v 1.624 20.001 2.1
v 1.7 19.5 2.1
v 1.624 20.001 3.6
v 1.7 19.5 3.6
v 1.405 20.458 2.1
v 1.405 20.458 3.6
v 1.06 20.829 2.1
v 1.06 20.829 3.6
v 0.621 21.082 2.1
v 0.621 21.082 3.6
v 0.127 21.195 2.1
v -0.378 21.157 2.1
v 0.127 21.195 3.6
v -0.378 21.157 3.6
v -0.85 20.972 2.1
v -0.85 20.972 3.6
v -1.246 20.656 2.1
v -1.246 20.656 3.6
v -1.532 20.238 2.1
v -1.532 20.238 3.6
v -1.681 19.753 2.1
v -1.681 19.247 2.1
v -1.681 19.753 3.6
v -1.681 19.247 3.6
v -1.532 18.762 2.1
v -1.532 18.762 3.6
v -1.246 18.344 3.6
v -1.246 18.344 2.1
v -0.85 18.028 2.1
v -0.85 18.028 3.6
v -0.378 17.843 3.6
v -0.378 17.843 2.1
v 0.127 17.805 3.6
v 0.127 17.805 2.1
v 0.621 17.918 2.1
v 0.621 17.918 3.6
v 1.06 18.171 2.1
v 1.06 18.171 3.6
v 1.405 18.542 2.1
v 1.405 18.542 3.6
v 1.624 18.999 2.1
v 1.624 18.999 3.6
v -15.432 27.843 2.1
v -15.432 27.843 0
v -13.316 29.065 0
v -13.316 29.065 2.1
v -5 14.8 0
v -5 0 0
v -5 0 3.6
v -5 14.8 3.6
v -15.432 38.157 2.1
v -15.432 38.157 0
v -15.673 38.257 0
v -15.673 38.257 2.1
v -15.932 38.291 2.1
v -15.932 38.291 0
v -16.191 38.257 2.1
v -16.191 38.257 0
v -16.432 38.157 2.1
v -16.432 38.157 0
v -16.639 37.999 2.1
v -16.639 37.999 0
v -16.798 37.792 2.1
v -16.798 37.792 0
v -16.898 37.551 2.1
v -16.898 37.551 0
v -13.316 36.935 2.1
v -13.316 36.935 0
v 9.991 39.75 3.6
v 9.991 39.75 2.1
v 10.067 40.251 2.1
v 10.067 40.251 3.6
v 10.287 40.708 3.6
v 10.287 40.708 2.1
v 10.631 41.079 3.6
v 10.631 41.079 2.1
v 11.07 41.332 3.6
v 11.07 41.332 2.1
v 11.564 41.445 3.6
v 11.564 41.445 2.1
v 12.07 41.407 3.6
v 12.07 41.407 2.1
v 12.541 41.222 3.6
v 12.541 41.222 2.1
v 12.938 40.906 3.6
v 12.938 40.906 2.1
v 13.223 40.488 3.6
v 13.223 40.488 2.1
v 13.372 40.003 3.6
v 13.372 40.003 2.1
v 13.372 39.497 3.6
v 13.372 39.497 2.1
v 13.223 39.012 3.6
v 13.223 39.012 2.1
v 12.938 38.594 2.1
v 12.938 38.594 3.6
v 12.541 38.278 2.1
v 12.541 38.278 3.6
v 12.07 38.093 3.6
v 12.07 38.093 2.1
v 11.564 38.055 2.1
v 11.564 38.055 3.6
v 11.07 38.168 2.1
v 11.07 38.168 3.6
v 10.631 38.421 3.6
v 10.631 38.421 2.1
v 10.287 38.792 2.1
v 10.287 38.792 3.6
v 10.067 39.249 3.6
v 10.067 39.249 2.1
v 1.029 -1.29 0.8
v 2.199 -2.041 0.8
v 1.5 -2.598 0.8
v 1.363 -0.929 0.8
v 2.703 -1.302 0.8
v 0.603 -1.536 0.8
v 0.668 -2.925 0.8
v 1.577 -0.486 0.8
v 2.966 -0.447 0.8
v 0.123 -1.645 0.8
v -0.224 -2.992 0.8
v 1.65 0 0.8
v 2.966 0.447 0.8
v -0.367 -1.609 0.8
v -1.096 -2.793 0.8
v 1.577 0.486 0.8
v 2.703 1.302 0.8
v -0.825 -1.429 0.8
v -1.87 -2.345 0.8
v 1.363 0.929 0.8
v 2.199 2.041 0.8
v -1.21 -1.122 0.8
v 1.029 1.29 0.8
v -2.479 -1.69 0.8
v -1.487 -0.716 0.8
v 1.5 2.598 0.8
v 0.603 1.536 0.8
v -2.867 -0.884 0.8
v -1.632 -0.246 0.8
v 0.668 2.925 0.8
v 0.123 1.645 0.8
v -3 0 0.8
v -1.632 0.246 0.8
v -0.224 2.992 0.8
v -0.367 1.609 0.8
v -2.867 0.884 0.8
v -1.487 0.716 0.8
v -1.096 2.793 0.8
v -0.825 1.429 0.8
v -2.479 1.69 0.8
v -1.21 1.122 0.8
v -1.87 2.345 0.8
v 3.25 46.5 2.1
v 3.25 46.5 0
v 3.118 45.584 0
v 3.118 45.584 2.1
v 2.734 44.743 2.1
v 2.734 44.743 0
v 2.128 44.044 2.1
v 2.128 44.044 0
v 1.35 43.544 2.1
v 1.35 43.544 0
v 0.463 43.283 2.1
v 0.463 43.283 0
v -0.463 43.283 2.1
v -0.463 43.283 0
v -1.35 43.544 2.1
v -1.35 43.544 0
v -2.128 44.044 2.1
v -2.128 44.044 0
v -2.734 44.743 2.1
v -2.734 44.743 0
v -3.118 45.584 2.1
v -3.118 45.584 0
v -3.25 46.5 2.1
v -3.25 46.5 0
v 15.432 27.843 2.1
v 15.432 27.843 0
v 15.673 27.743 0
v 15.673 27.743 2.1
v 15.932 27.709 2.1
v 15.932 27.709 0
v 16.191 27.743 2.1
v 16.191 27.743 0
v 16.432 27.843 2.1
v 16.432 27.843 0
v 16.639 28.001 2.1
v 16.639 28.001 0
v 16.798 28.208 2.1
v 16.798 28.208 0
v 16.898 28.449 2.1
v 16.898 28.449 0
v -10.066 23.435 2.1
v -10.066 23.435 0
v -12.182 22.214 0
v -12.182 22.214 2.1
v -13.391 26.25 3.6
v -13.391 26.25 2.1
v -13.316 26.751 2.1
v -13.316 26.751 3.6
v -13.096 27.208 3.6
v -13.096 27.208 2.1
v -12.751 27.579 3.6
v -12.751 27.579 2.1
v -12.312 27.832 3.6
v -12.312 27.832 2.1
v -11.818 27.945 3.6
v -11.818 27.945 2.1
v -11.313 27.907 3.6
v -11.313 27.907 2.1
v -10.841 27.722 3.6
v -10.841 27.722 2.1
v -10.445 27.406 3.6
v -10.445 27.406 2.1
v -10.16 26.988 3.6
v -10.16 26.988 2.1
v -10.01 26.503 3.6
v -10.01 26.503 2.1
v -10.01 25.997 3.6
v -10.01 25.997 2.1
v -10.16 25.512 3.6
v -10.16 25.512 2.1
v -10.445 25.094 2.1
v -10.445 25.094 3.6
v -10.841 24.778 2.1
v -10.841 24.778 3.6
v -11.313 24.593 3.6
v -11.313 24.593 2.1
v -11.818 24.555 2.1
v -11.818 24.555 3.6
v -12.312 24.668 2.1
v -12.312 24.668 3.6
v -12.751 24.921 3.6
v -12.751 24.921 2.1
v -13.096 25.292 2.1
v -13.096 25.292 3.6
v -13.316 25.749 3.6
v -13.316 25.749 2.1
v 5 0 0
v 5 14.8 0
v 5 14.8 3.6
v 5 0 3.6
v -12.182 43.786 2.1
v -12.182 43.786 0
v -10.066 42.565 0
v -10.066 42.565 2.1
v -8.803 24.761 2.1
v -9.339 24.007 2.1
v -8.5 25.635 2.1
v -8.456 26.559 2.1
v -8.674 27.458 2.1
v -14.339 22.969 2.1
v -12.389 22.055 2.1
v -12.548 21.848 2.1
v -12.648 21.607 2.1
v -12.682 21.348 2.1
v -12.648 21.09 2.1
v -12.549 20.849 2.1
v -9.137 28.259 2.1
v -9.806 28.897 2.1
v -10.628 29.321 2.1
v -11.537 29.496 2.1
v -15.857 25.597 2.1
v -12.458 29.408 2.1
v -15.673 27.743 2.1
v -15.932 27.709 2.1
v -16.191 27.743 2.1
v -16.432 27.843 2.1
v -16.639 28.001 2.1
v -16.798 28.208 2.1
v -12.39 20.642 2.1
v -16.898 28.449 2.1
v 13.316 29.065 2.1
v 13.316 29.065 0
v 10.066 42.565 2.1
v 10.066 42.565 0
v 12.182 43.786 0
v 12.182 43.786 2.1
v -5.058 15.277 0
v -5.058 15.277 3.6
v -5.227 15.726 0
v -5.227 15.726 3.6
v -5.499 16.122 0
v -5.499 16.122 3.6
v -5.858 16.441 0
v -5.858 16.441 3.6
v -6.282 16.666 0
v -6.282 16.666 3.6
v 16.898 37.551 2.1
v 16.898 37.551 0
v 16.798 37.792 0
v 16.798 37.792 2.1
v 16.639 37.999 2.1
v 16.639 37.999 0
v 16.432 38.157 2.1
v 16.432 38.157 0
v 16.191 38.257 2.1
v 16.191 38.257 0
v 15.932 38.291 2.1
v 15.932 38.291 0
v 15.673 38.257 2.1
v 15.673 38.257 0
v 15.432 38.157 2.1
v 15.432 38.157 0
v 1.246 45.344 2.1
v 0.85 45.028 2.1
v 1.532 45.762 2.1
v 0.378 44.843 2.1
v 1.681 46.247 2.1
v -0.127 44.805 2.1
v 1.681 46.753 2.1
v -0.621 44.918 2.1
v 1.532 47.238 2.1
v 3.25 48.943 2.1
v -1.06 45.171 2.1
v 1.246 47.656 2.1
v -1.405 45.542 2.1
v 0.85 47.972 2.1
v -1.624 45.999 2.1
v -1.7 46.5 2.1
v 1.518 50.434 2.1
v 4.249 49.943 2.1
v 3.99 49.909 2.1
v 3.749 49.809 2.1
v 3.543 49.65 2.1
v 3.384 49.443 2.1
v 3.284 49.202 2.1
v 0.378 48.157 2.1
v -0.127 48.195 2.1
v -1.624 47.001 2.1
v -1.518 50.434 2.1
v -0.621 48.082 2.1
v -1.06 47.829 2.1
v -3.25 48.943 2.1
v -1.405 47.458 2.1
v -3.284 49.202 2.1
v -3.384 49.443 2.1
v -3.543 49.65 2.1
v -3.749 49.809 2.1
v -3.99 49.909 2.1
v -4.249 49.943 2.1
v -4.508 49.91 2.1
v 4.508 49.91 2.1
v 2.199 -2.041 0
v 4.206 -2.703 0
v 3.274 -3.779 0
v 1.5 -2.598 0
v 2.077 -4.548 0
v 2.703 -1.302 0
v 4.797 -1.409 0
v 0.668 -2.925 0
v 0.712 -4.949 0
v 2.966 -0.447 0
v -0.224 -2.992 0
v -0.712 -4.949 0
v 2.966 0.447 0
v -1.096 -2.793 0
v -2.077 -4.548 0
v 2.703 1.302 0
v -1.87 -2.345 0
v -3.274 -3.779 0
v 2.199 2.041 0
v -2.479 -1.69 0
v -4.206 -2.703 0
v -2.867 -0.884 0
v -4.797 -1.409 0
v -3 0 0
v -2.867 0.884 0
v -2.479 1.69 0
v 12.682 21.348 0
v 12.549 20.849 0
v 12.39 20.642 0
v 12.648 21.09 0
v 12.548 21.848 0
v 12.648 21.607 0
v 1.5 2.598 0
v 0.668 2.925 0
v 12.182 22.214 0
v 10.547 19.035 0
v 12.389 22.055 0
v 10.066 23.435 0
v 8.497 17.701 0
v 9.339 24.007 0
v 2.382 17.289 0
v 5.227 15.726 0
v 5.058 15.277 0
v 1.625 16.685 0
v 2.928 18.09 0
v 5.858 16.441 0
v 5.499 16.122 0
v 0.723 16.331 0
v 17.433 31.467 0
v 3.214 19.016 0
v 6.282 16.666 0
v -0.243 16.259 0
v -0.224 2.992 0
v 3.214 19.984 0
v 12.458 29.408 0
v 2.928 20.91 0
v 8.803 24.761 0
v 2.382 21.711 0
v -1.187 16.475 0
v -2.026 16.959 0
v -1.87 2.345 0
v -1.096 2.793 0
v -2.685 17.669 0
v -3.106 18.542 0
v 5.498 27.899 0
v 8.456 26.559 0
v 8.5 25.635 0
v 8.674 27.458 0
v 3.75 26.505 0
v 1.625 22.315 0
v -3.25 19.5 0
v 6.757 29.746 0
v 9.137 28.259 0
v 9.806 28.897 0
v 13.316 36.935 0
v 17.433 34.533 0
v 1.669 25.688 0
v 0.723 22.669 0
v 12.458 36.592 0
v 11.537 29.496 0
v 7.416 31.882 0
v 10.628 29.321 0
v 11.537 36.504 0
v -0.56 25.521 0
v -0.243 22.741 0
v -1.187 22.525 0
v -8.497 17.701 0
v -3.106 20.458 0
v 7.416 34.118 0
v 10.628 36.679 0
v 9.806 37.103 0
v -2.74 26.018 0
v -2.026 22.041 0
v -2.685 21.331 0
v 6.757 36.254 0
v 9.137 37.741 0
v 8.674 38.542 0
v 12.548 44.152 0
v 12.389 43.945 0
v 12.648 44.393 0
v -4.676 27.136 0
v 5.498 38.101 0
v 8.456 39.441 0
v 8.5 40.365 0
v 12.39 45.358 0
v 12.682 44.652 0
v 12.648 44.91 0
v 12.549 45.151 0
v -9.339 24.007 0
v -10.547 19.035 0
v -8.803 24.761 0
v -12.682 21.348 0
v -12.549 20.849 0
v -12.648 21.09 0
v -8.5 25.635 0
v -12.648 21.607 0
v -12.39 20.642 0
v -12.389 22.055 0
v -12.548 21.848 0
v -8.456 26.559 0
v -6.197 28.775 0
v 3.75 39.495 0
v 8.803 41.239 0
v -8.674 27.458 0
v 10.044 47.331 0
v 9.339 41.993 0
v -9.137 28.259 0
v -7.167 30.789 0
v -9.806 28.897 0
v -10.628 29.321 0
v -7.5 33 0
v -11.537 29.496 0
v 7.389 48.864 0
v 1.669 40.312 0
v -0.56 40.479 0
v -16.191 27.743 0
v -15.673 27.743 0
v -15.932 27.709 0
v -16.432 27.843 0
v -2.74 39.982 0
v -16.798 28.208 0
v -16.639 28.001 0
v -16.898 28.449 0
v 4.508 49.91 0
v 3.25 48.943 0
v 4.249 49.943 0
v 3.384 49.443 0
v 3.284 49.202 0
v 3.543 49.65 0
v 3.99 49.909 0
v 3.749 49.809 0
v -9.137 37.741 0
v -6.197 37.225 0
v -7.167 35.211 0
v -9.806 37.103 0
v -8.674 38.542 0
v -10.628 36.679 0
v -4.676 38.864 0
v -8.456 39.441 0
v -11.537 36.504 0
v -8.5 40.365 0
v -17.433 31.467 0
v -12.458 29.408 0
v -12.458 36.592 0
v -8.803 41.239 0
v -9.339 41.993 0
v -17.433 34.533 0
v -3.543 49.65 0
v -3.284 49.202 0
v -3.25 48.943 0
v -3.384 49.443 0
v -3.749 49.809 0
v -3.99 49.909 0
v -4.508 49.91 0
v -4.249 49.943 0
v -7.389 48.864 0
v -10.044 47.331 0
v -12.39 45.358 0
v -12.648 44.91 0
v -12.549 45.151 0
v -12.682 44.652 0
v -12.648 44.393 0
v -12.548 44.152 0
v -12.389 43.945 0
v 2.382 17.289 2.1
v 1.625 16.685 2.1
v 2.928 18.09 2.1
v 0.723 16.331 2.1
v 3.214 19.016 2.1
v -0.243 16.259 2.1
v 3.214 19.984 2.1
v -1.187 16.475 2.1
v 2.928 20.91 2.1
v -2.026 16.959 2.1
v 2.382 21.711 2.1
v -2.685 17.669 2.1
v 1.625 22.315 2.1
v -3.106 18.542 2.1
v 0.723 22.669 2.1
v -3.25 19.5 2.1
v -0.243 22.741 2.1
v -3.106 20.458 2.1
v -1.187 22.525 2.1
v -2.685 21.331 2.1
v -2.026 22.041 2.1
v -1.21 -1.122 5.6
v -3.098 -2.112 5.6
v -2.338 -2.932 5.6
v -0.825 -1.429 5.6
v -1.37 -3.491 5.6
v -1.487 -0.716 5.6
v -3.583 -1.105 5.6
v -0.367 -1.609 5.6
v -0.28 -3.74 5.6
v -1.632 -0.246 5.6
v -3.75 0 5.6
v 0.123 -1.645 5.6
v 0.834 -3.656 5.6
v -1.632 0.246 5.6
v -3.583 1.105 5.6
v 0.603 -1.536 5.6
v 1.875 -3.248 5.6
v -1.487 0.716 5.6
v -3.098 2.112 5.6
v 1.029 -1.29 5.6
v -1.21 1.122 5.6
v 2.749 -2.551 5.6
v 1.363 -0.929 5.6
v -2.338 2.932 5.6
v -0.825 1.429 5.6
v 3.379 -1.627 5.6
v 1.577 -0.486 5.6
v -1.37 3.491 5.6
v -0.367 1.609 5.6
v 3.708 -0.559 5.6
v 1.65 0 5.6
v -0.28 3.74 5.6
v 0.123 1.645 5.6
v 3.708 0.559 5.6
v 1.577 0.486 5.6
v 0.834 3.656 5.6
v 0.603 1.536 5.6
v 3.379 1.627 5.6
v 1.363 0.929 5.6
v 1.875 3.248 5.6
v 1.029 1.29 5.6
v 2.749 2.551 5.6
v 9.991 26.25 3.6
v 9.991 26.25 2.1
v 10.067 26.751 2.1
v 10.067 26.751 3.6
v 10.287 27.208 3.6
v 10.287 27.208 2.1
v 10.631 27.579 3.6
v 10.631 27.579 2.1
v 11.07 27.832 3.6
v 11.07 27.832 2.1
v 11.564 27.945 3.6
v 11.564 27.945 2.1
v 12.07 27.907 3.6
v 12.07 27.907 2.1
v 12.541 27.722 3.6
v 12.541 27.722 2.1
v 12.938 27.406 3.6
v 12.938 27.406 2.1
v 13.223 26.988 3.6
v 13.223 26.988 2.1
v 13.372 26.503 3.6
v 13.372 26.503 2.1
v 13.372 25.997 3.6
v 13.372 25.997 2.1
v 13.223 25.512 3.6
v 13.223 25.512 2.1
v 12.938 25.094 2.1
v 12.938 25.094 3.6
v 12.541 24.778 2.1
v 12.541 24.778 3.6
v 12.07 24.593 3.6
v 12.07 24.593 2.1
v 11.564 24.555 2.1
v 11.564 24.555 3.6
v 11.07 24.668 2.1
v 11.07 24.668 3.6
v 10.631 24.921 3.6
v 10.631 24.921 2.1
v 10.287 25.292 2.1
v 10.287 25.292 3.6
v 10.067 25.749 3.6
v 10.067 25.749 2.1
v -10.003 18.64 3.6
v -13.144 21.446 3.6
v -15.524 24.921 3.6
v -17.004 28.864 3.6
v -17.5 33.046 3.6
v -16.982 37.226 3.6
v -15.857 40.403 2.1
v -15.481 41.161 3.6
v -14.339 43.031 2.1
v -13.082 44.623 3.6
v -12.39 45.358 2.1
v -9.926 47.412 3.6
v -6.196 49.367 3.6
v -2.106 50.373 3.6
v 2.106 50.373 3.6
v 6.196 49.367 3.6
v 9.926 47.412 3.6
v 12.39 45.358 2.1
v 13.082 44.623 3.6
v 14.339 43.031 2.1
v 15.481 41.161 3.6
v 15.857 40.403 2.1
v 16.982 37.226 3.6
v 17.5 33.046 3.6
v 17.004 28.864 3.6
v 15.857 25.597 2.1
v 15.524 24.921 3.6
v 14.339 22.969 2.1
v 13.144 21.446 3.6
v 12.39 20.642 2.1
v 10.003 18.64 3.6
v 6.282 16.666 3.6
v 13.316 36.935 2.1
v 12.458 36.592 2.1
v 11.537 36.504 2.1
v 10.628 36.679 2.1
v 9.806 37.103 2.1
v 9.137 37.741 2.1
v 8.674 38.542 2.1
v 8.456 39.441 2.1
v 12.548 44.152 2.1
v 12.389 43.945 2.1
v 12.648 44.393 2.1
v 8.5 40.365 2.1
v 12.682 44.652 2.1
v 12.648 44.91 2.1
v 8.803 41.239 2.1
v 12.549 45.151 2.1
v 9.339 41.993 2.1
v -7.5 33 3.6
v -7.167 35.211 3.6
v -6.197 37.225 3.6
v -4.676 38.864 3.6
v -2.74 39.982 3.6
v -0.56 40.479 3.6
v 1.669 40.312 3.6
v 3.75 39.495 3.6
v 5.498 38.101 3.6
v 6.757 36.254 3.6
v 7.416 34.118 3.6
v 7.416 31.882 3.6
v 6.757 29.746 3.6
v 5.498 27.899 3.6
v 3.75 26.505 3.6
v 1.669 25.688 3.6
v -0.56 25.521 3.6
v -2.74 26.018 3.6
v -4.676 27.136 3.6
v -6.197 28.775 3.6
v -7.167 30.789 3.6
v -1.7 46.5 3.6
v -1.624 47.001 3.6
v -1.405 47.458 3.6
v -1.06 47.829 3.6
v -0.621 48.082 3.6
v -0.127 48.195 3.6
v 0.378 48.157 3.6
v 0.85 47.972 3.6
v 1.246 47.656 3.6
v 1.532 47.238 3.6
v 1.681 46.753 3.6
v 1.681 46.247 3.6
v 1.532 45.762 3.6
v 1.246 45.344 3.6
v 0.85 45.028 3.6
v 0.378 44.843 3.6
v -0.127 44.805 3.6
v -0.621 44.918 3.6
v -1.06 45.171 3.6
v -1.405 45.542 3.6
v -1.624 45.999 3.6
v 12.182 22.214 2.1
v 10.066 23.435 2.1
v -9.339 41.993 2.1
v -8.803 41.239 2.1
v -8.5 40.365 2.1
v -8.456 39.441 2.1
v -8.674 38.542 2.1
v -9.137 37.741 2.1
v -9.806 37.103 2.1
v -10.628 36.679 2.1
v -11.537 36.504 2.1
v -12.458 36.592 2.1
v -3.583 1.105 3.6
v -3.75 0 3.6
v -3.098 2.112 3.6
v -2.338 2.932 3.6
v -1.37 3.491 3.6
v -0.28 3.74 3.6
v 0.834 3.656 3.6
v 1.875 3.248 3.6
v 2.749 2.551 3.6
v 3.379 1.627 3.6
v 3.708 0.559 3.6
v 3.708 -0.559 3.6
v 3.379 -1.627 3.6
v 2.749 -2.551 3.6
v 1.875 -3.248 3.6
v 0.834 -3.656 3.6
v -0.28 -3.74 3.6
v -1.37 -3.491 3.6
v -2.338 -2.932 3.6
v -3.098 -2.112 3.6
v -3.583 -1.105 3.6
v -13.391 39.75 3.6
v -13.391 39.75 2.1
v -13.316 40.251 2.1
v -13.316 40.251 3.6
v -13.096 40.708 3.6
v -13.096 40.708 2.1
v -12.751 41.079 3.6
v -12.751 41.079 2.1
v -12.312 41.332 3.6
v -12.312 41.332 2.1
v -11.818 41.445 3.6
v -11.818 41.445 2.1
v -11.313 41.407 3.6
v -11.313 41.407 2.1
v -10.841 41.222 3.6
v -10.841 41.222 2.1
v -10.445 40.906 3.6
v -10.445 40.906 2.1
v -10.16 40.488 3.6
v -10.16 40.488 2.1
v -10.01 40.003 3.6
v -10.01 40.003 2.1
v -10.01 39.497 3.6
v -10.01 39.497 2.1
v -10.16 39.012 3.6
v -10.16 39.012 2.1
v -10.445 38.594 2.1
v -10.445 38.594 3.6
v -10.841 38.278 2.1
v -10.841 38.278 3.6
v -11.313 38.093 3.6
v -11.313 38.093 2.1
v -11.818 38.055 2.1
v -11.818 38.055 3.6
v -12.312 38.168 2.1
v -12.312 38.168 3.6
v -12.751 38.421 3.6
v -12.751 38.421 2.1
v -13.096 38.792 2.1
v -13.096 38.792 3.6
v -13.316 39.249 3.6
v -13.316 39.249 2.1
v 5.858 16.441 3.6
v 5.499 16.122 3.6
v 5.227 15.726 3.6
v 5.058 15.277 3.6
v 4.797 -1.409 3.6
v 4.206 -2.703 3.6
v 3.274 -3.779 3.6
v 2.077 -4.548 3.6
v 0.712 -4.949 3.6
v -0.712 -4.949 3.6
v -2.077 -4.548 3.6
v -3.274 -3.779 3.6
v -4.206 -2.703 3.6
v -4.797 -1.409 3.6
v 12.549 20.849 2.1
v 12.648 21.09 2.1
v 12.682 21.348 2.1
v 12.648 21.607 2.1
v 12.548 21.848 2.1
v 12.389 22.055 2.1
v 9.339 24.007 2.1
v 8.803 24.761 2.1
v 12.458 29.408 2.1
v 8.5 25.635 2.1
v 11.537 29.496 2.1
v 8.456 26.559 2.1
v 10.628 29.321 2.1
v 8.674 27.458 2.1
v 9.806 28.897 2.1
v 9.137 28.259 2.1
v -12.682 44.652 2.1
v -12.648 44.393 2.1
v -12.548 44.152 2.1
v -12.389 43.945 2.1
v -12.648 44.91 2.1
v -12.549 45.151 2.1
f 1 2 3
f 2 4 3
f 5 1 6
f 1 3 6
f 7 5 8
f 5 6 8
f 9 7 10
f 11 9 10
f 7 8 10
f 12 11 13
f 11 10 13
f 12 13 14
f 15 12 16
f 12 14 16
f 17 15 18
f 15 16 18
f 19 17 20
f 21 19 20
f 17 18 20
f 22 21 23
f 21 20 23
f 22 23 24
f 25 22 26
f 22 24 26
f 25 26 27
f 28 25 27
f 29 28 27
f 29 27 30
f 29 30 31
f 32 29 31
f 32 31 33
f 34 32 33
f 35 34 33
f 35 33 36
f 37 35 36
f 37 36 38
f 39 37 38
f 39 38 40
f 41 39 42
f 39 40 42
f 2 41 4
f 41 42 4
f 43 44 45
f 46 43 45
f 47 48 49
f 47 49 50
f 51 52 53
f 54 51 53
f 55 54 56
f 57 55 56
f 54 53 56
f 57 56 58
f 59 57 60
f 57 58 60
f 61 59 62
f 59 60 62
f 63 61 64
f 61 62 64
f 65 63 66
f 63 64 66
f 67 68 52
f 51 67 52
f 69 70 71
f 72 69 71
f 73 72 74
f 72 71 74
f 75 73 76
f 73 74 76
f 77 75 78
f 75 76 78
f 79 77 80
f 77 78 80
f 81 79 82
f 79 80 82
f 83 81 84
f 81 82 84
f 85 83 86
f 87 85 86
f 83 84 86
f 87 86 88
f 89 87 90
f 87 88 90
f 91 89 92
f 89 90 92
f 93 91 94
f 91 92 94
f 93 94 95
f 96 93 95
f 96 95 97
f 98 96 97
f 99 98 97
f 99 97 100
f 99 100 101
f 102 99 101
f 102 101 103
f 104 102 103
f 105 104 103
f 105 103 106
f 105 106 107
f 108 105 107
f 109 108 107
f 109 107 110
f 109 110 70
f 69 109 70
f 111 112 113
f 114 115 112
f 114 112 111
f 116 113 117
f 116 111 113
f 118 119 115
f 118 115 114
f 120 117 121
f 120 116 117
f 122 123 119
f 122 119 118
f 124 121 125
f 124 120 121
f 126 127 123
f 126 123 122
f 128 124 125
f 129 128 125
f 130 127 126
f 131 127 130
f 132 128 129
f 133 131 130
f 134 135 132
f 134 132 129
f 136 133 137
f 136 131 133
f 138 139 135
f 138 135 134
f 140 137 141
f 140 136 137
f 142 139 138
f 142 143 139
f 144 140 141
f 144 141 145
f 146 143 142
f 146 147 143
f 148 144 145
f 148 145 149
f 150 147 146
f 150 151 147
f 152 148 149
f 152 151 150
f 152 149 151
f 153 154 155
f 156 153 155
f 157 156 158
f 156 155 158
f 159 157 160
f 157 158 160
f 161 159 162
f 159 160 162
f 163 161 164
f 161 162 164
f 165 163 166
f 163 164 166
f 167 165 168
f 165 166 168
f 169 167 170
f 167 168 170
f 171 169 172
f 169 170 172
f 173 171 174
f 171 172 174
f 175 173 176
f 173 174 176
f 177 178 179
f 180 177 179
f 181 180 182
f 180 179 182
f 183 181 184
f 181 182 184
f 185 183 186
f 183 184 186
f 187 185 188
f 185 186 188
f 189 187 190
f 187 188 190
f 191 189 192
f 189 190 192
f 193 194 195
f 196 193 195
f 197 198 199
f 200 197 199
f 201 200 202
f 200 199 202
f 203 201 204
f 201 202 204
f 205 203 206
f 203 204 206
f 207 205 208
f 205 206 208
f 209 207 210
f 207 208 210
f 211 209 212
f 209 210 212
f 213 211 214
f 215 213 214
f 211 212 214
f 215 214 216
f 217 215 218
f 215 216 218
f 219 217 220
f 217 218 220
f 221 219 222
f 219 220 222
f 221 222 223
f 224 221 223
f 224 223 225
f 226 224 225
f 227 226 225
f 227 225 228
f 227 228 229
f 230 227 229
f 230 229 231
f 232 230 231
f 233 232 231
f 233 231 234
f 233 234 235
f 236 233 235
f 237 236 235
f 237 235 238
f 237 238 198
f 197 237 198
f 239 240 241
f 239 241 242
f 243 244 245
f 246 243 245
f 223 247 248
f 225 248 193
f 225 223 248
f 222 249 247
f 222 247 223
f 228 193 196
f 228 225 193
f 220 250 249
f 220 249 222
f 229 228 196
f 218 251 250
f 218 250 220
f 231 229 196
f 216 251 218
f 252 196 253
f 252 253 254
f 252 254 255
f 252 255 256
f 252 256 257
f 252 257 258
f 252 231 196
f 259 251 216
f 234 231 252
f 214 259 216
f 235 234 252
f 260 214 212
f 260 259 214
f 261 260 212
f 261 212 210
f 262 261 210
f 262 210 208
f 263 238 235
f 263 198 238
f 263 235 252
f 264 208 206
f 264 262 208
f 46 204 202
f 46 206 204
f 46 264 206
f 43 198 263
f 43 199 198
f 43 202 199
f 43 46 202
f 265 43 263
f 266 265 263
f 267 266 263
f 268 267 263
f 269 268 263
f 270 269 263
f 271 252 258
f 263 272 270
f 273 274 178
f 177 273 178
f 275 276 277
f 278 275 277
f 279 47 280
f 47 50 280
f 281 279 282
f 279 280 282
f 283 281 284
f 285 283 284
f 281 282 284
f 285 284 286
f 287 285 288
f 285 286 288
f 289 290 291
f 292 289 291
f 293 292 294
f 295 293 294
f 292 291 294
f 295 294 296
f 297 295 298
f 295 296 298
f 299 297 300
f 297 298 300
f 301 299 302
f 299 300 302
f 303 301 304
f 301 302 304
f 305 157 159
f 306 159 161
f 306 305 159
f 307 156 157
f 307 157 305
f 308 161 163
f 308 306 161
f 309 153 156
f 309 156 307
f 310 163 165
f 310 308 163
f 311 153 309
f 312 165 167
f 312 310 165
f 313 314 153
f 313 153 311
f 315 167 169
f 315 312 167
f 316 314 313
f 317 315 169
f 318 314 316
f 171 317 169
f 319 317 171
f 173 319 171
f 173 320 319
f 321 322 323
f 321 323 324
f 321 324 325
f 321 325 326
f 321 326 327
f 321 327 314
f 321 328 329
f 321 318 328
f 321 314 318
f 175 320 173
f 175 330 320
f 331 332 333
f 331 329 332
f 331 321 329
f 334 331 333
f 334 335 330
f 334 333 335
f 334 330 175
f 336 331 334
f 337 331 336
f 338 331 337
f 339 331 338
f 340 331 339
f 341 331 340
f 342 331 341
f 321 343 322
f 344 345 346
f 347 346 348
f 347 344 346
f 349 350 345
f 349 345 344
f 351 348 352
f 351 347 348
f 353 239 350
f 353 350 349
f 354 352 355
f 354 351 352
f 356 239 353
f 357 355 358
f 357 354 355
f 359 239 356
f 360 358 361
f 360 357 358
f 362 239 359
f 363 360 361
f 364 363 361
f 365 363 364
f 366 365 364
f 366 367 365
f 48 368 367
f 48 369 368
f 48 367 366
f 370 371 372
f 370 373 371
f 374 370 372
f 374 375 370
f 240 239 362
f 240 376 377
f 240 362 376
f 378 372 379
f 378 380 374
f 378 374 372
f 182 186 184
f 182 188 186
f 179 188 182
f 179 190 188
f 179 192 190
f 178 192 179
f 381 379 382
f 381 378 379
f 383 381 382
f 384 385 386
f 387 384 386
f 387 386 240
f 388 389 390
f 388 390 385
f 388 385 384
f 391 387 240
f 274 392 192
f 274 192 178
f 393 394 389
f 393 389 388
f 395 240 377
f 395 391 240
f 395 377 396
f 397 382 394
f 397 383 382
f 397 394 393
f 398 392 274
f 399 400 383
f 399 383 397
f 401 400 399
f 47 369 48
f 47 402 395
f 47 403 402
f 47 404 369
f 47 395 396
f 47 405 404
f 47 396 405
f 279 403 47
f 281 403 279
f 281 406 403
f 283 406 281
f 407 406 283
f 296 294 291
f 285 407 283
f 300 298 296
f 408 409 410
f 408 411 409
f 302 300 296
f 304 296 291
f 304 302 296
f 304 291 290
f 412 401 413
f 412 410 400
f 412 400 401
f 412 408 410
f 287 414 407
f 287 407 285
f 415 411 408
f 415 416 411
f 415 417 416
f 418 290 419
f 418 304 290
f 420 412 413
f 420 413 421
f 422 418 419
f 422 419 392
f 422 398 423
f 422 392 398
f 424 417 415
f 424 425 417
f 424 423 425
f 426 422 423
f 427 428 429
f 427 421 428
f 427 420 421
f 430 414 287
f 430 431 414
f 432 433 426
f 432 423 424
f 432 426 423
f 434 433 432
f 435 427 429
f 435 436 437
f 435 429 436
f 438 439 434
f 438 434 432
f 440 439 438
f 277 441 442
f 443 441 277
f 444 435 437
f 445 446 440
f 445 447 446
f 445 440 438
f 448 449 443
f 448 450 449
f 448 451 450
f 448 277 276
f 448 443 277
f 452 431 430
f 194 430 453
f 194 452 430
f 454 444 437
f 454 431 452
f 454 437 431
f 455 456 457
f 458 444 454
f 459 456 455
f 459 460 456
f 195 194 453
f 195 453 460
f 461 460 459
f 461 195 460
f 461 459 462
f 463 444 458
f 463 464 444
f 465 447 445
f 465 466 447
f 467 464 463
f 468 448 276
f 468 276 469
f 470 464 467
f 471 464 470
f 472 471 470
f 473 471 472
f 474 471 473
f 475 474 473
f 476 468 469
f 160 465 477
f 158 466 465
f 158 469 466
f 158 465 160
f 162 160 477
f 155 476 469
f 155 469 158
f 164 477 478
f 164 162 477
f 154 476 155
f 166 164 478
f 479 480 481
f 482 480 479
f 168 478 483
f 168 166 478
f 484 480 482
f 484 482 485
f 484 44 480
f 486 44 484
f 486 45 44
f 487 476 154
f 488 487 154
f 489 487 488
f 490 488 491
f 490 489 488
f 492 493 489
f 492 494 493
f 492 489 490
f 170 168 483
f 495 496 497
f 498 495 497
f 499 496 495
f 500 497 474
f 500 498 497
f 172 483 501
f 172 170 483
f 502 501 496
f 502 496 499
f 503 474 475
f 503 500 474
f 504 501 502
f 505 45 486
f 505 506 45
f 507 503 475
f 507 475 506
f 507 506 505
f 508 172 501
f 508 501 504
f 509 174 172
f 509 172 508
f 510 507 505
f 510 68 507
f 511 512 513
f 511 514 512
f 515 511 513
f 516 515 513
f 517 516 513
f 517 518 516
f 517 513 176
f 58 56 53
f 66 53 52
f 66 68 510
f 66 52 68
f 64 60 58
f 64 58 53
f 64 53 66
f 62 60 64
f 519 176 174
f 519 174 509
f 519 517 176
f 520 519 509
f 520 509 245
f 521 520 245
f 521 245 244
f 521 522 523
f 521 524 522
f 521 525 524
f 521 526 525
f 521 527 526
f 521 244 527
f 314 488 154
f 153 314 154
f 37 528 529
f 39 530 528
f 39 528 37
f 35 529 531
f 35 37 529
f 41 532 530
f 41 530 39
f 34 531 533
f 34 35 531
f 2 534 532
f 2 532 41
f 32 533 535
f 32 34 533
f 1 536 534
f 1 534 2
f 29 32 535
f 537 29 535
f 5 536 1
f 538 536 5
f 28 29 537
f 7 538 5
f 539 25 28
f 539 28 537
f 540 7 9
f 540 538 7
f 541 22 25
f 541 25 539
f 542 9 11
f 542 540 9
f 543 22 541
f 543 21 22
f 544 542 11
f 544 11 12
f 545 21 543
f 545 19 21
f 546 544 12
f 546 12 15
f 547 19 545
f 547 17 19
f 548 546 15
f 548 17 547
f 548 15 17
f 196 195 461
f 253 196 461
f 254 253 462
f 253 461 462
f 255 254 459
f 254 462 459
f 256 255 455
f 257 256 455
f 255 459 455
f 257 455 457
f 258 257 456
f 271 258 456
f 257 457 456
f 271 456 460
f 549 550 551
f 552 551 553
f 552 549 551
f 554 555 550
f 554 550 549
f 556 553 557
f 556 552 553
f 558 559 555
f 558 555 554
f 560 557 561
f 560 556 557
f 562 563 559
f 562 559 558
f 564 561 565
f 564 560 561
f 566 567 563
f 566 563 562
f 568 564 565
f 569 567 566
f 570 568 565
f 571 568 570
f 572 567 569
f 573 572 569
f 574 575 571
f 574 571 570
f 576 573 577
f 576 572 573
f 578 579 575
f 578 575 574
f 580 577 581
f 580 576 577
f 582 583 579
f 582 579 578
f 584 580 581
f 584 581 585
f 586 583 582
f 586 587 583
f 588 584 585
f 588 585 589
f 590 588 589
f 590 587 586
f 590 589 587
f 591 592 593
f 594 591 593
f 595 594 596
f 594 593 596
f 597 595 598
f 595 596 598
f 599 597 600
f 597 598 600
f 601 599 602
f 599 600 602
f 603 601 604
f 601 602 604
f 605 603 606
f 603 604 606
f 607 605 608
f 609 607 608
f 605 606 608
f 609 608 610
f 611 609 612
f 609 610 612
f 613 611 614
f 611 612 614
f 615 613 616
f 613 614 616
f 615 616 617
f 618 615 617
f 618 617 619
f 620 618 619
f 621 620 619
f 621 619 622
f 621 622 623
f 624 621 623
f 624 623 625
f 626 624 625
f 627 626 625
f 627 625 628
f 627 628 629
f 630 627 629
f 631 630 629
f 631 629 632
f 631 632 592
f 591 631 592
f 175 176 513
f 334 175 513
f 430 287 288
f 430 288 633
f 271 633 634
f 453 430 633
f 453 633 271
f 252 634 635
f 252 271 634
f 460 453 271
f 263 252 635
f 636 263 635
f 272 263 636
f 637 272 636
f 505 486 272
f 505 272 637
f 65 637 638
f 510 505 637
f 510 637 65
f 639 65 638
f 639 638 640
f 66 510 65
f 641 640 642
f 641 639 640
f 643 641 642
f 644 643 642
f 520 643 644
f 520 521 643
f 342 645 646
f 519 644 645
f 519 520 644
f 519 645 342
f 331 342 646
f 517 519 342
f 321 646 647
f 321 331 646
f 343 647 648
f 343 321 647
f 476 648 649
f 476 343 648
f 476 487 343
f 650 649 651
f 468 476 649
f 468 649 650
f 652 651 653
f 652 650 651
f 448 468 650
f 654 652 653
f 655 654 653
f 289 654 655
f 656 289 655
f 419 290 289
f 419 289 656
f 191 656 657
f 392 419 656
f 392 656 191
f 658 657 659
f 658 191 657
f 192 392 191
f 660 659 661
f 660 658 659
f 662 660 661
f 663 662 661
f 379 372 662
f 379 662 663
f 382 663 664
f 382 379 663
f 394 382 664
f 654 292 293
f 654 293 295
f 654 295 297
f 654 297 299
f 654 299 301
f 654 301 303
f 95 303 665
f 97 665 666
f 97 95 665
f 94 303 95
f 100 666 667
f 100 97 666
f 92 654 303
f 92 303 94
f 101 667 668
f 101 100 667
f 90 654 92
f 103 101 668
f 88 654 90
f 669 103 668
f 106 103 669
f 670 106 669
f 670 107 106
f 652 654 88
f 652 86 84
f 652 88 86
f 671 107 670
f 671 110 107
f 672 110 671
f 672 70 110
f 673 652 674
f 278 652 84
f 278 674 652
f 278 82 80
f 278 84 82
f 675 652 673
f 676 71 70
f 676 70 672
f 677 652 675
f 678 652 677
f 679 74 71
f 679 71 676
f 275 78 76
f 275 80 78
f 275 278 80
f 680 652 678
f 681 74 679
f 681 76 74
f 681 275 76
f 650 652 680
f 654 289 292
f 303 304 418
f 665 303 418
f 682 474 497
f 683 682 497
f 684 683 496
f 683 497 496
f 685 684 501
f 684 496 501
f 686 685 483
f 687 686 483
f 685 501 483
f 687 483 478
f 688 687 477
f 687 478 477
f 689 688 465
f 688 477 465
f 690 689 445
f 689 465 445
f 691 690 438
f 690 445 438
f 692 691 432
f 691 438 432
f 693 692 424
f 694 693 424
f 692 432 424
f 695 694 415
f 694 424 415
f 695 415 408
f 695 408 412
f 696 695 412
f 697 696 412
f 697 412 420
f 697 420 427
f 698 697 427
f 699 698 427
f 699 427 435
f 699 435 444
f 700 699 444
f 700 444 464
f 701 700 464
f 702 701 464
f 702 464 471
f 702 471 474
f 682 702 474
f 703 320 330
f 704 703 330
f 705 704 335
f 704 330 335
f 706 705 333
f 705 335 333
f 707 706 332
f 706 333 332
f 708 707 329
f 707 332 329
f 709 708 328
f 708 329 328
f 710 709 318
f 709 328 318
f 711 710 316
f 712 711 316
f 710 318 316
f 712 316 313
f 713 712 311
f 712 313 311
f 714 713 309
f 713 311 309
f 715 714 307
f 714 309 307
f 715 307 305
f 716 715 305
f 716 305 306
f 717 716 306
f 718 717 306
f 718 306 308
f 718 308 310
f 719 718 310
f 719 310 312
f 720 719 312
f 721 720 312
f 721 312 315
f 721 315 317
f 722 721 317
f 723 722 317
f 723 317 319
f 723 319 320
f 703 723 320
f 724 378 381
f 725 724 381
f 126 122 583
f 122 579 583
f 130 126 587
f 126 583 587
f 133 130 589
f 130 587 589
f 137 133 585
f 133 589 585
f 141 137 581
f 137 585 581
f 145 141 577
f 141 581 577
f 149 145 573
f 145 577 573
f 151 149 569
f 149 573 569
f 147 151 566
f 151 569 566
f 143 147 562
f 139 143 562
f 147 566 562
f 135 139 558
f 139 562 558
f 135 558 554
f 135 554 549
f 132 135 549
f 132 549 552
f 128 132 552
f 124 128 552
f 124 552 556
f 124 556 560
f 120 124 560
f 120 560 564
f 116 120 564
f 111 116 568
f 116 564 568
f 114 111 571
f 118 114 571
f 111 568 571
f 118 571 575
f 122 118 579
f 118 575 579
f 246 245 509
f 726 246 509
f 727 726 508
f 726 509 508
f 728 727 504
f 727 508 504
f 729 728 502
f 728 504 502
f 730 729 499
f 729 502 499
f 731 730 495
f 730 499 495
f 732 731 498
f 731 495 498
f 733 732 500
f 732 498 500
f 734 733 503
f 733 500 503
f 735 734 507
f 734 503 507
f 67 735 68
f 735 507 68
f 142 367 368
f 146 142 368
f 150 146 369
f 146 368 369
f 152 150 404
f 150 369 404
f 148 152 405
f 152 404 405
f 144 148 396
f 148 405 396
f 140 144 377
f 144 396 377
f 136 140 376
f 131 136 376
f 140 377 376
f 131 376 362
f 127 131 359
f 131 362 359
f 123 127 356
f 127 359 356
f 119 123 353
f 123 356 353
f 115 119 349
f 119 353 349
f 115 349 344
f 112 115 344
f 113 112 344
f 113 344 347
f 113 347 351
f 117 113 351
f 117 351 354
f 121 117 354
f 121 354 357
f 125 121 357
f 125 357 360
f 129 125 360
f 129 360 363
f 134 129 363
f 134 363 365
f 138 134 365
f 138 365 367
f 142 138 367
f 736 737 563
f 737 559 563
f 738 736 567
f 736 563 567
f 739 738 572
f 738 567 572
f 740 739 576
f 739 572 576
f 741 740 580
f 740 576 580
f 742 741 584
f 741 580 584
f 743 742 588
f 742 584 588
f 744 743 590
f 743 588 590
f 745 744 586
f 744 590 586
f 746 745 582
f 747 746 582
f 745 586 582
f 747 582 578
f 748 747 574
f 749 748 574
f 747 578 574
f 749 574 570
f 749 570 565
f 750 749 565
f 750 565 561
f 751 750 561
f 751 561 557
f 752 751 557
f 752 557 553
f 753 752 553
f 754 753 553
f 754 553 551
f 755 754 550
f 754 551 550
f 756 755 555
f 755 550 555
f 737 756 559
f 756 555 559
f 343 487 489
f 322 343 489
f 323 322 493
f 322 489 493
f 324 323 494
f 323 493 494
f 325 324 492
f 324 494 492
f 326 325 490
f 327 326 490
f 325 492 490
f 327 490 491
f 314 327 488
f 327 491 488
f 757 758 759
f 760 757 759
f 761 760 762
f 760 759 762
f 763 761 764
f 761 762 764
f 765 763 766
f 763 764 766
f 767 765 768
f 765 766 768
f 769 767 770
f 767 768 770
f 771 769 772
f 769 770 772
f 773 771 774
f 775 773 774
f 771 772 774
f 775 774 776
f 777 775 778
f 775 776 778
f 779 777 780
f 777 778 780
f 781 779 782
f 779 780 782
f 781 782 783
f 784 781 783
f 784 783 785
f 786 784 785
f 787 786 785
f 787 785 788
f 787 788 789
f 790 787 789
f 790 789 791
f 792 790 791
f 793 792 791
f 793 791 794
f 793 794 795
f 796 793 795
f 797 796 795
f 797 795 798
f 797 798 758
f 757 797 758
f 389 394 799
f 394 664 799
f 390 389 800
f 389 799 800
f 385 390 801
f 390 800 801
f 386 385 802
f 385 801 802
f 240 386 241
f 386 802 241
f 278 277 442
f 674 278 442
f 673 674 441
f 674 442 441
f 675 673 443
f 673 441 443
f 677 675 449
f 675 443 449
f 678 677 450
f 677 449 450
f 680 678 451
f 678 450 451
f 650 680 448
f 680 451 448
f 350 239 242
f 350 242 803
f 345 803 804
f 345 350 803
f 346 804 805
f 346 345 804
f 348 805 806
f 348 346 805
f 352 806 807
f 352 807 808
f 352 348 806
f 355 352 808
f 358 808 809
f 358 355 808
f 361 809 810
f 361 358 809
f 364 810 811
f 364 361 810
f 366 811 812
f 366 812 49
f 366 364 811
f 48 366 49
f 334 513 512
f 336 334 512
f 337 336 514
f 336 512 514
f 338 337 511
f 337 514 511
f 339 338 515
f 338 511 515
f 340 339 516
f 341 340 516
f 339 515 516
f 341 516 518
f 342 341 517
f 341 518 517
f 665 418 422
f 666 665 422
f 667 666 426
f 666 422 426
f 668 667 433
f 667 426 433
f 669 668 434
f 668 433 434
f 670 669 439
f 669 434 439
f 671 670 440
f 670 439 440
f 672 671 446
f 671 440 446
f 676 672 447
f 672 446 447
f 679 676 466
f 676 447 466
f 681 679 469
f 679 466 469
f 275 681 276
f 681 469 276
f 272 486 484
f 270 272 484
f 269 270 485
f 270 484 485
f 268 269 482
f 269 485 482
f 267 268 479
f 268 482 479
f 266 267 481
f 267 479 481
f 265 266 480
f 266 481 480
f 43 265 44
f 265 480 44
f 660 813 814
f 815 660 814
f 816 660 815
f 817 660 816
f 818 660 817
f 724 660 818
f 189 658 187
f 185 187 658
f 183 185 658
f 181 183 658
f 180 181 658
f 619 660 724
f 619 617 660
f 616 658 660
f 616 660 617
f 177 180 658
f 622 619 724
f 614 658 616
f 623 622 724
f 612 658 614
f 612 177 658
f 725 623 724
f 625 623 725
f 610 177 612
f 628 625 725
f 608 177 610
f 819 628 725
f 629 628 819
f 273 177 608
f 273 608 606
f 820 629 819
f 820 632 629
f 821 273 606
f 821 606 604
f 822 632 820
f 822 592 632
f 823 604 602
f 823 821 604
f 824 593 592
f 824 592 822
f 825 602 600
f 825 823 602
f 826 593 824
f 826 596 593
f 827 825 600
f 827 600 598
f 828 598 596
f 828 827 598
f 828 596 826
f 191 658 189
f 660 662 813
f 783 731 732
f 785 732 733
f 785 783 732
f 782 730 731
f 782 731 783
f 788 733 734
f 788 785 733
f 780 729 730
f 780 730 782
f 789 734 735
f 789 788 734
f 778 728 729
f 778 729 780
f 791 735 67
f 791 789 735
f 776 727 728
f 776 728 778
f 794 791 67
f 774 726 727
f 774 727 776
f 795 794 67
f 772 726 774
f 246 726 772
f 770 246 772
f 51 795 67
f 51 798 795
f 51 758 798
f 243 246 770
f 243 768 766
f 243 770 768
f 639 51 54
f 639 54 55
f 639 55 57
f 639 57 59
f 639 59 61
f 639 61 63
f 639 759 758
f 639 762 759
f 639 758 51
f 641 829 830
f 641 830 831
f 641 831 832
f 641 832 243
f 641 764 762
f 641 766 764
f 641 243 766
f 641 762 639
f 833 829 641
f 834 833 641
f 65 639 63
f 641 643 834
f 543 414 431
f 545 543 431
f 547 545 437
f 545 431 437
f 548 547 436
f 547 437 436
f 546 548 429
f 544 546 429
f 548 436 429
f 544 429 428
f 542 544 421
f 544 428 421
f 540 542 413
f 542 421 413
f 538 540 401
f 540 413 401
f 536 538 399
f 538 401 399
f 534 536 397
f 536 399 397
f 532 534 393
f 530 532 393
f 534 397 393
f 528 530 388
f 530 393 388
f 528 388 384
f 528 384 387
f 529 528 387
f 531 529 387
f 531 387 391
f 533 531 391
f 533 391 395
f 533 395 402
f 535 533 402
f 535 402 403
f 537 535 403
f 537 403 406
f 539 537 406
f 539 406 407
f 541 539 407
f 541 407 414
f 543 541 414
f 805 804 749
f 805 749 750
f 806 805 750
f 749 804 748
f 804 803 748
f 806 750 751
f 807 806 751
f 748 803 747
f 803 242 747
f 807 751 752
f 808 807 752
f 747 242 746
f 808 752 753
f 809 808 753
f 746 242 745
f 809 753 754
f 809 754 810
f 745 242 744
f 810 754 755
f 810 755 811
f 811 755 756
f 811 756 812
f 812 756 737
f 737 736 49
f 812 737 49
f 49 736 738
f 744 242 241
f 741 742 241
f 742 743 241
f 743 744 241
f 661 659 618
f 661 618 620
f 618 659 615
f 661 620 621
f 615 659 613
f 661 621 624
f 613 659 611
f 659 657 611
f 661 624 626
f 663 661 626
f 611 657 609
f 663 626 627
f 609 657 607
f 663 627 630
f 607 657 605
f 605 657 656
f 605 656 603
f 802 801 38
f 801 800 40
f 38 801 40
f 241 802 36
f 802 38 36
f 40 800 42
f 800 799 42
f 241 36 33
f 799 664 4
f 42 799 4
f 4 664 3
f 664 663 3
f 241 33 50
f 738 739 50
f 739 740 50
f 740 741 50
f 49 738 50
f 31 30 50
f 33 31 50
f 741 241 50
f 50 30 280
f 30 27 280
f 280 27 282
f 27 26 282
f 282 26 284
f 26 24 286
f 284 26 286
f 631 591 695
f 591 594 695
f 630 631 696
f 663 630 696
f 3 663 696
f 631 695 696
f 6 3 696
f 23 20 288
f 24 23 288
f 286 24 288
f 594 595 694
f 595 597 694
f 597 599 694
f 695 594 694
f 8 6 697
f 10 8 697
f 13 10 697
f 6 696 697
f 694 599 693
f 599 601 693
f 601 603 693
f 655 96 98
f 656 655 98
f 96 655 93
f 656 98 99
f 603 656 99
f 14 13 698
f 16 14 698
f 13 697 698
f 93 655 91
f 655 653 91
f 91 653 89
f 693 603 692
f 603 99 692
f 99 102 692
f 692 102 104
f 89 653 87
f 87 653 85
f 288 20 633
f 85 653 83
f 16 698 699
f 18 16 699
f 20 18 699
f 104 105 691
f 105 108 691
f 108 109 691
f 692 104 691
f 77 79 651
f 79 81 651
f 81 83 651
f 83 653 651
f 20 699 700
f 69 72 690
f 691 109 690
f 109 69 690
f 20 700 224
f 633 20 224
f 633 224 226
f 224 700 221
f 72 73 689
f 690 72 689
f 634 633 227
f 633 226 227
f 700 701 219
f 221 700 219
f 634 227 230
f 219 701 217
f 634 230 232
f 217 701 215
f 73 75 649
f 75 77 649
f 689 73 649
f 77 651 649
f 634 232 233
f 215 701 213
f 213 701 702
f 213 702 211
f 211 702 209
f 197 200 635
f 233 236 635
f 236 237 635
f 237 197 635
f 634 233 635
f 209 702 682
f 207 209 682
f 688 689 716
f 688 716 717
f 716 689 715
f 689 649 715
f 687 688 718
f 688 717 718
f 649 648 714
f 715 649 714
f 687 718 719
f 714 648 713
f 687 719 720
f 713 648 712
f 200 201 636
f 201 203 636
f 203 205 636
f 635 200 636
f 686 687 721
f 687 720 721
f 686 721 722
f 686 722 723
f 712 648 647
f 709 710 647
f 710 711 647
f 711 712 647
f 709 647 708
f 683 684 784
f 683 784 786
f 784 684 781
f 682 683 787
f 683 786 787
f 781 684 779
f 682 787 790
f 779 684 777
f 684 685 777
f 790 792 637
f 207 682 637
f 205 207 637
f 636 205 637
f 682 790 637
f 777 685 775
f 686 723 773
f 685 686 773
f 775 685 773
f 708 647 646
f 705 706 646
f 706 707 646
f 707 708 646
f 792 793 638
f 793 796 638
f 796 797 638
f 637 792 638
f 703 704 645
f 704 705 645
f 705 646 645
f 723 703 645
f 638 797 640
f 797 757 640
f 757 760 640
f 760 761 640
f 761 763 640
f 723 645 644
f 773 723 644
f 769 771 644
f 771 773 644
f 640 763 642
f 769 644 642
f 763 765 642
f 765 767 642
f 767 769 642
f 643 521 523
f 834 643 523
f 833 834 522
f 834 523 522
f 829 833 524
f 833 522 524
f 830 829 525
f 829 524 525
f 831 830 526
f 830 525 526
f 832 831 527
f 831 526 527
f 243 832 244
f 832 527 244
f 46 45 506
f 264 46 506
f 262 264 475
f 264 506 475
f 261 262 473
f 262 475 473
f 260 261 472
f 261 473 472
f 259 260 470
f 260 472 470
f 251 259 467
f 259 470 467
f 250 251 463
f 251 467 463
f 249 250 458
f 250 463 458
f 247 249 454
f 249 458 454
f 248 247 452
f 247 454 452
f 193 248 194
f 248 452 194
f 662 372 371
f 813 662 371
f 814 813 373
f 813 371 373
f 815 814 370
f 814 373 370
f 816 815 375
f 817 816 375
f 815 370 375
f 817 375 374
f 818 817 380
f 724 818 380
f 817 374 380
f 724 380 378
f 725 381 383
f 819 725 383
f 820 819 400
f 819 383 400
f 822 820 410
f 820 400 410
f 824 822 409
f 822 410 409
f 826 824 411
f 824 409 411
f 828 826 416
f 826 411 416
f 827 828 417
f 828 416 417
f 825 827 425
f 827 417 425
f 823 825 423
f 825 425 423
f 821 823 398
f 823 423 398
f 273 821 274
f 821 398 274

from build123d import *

# Parameters (mm, degrees)
EXTRUDE_1_DEPTH              = 3.6
CUT_EXTRUDE_1_DEPTH          = 2.1
CUT_EXTRUDE_2_DEPTH          = 2.1
CUT_EXTRUDE_3_DEPTH          = 2.1
CUT_EXTRUDE_4_DEPTH          = 2.1
CUT_EXTRUDE_5_DEPTH          = 2.1
SKETCH_7_W                   = 3.75
SKETCH_7_H                   = 2
HOLE_WIZARD_M3_1_D           = 3.3
HOLE_WIZARD_M3_1_CBORE_D     = 6
HOLE_WIZARD_M3_1_CBORE_DEPTH = 0.8
HOLE_WIZARD_3_4_3_4_1_D      = 3.4
HOLE_WIZARD_3_4_3_4_1_DEPTH  = 3.6
HOLE_WIZARD_M3_2_D           = 3.4
HOLE_WIZARD_M3_2_DEPTH       = 5.6
HOLE_WIZARD_M3_2_CBORE_D     = 6.5
HOLE_WIZARD_M3_2_CBORE_DEPTH = 2.1
HOLE_WIZARD_15_0_15_1_D      = 15
FILLET_1_R                   = 2


with BuildPart() as part:
    # 草图1 → 凸台-拉伸1 (new body)
    with BuildSketch(Plane(origin=(0, 0, 0), x_dir=(-1, 0, 0), z_dir=(0, 0, -1))):
        with BuildLine():
            Line((5, 0), (5, 16.229490169))
            ThreePointArc((5, 16.229490169), (0, 50.5), (-5, 16.229490169))
            Line((-5, 16.229490169), (-5, 0))
            ThreePointArc((-5, 0), (0, -5), (5, 0))
        make_face()
    extrude(amount=-EXTRUDE_1_DEPTH)

    # 草图2 → 切除-拉伸1 (cut)
    with BuildSketch(Plane(origin=(0, 0, 0), x_dir=(-1, 0, 0), z_dir=(0, 0, -1))):
        with BuildLine():
            Line((15.432267108, 27.842953181), (13.316342951, 29.064582562))
            ThreePointArc((13.316342951, 29.064582562), (8.876760389, 27.875), (10.066342951, 23.435417438))
            Line((10.066342951, 23.435417438), (12.182267108, 22.213788056))
            ThreePointArc((12.182267108, 22.213788056), (12.673627776, 21.478926775), (12.390283297, 20.641566449))
            ThreePointArc((12.390283297, 20.641566449), (15.155444566, 24.25), (16.897859054, 28.44891668))
            ThreePointArc((16.897859054, 28.44891668), (16.31435598, 27.784853001), (15.432267108, 27.842953181))
        make_face()
    extrude(amount=-CUT_EXTRUDE_1_DEPTH, mode=Mode.SUBTRACT)

    # 草图3 → 切除-拉伸2 (cut)
    with BuildSketch(Plane(origin=(0, 0, 0), x_dir=(-1, 0, 0), z_dir=(0, 0, -1))):
        with BuildLine():
            Line((12.182267108, 43.786211944), (10.066342951, 42.564582562))
            ThreePointArc((10.066342951, 42.564582562), (8.876760389, 38.125), (13.316342951, 36.935417438))
            Line((13.316342951, 36.935417438), (15.432267108, 38.157046819))
            ThreePointArc((15.432267108, 38.157046819), (16.31435598, 38.215146999), (16.897859054, 37.55108332))
            ThreePointArc((16.897859054, 37.55108332), (15.155444566, 41.75), (12.390283297, 45.358433551))
            ThreePointArc((12.390283297, 45.358433551), (12.673627776, 44.521073225), (12.182267108, 43.786211944))
        make_face()
    extrude(amount=-CUT_EXTRUDE_2_DEPTH, mode=Mode.SUBTRACT)

    # 草图4 → 切除-拉伸3 (cut)
    with BuildSketch(Plane(origin=(0, 0, 0), x_dir=(-1, 0, 0), z_dir=(0, 0, -1))):
        with BuildLine():
            Line((-3.25, 48.943258764), (-3.25, 46.5))
            ThreePointArc((-3.25, 46.5), (0, 43.25), (3.25, 46.5))
            Line((3.25, 46.5), (3.25, 48.943258764))
            ThreePointArc((3.25, 48.943258764), (3.640728204, 49.736220225), (4.507575758, 49.90951687))
            ThreePointArc((4.507575758, 49.90951687), (0, 50.5), (-4.507575758, 49.90951687))
            ThreePointArc((-4.507575758, 49.90951687), (-3.640728204, 49.736220225), (-3.25, 48.943258764))
        make_face()
    extrude(amount=-CUT_EXTRUDE_3_DEPTH, mode=Mode.SUBTRACT)

    # 草图5 → 切除-拉伸4 (cut)
    with BuildSketch(Plane(origin=(0, 0, 0), x_dir=(-1, 0, 0), z_dir=(0, 0, -1))):
        with BuildLine():
            Line((-15.432267108, 38.157046819), (-13.316342951, 36.935417438))
            ThreePointArc((-13.316342951, 36.935417438), (-8.876760389, 38.125), (-10.066342951, 42.564582562))
            Line((-10.066342951, 42.564582562), (-12.182267108, 43.786211944))
            ThreePointArc((-12.182267108, 43.786211944), (-12.673627776, 44.521073225), (-12.390283297, 45.358433551))
            ThreePointArc((-12.390283297, 45.358433551), (-15.155444566, 41.75), (-16.897859054, 37.55108332))
            ThreePointArc((-16.897859054, 37.55108332), (-16.31435598, 38.215146999), (-15.432267108, 38.157046819))
        make_face()
    extrude(amount=-CUT_EXTRUDE_4_DEPTH, mode=Mode.SUBTRACT)

    # 草图6 → 切除-拉伸5 (cut)
    with BuildSketch(Plane(origin=(0, 0, 0), x_dir=(-1, 0, 0), z_dir=(0, 0, -1))):
        with BuildLine():
            Line((-12.182267108, 22.213788056), (-10.066342951, 23.435417438))
            ThreePointArc((-10.066342951, 23.435417438), (-8.876760389, 27.875), (-13.316342951, 29.064582562))
            Line((-13.316342951, 29.064582562), (-15.432267108, 27.842953181))
            ThreePointArc((-15.432267108, 27.842953181), (-16.31435598, 27.784853001), (-16.897859054, 28.44891668))
            ThreePointArc((-16.897859054, 28.44891668), (-15.155444566, 24.25), (-12.390283297, 20.641566449))
            ThreePointArc((-12.390283297, 20.641566449), (-12.673627776, 21.478926775), (-12.182267108, 22.213788056))
        make_face()
    extrude(amount=-CUT_EXTRUDE_5_DEPTH, mode=Mode.SUBTRACT)

    # 草图7 → 旋转1 (revolve)
    with BuildSketch(Plane.XZ, mode=Mode.PRIVATE) as revolve_1_sk:
        with Locations((1.875, 4.6)):
            Rectangle(SKETCH_7_W, SKETCH_7_H)
    revolve(revolve_1_sk.sketch.rotate(Axis((0, 0, 5.6), (0, 0, -1)), 180), axis=Axis((0, 0, 5.6), (0, 0, -1)))

    # M3 六角头机械螺钉的柱形沉头孔1 (through all)
    with Locations(Plane(origin=(0, 0, 0), x_dir=(-1, 0, 0), z_dir=(0, 0, -1))):
        with Locations((0, 0)):
            CounterBoreHole(HOLE_WIZARD_M3_1_D / 2, HOLE_WIZARD_M3_1_CBORE_D / 2, HOLE_WIZARD_M3_1_CBORE_DEPTH)

    # Ø3.4 (3.4) 直径孔1
    with Locations(Plane.XY.offset(3.6)):
        with Locations((-11.691342951, 26.25), (-11.691342951, 39.75), (0, 46.5), (11.691342951, 39.75), (11.691342951, 26.25)):
            Hole(HOLE_WIZARD_3_4_3_4_1_D / 2, depth=HOLE_WIZARD_3_4_3_4_1_DEPTH)

    # M3 六角头机械螺钉的柱形沉头孔2
    with Locations(Plane(origin=(0, 0, 0), x_dir=(-1, 0, 0), z_dir=(0, 0, -1))):
        with Locations((0, 19.5)):
            CounterBoreHole(HOLE_WIZARD_M3_2_D / 2, HOLE_WIZARD_M3_2_CBORE_D / 2, HOLE_WIZARD_M3_2_CBORE_DEPTH, depth=HOLE_WIZARD_M3_2_DEPTH)

    # Ø15.0 (15) 直径孔1 (through all)
    with Locations(Plane.XY.offset(3.6)):
        with Locations((0, 33)):
            Hole(HOLE_WIZARD_15_0_15_1_D / 2)

    # 圆角1
    fillet_1_edges = [part.edges().sort_by_distance(p)[0] for p in [
        (5, 16.229490169, 1.8),
        (-5, 16.229490169, 1.8),
    ]]
    fillet(fillet_1_edges, radius=FILLET_1_R)


solid = part.part
